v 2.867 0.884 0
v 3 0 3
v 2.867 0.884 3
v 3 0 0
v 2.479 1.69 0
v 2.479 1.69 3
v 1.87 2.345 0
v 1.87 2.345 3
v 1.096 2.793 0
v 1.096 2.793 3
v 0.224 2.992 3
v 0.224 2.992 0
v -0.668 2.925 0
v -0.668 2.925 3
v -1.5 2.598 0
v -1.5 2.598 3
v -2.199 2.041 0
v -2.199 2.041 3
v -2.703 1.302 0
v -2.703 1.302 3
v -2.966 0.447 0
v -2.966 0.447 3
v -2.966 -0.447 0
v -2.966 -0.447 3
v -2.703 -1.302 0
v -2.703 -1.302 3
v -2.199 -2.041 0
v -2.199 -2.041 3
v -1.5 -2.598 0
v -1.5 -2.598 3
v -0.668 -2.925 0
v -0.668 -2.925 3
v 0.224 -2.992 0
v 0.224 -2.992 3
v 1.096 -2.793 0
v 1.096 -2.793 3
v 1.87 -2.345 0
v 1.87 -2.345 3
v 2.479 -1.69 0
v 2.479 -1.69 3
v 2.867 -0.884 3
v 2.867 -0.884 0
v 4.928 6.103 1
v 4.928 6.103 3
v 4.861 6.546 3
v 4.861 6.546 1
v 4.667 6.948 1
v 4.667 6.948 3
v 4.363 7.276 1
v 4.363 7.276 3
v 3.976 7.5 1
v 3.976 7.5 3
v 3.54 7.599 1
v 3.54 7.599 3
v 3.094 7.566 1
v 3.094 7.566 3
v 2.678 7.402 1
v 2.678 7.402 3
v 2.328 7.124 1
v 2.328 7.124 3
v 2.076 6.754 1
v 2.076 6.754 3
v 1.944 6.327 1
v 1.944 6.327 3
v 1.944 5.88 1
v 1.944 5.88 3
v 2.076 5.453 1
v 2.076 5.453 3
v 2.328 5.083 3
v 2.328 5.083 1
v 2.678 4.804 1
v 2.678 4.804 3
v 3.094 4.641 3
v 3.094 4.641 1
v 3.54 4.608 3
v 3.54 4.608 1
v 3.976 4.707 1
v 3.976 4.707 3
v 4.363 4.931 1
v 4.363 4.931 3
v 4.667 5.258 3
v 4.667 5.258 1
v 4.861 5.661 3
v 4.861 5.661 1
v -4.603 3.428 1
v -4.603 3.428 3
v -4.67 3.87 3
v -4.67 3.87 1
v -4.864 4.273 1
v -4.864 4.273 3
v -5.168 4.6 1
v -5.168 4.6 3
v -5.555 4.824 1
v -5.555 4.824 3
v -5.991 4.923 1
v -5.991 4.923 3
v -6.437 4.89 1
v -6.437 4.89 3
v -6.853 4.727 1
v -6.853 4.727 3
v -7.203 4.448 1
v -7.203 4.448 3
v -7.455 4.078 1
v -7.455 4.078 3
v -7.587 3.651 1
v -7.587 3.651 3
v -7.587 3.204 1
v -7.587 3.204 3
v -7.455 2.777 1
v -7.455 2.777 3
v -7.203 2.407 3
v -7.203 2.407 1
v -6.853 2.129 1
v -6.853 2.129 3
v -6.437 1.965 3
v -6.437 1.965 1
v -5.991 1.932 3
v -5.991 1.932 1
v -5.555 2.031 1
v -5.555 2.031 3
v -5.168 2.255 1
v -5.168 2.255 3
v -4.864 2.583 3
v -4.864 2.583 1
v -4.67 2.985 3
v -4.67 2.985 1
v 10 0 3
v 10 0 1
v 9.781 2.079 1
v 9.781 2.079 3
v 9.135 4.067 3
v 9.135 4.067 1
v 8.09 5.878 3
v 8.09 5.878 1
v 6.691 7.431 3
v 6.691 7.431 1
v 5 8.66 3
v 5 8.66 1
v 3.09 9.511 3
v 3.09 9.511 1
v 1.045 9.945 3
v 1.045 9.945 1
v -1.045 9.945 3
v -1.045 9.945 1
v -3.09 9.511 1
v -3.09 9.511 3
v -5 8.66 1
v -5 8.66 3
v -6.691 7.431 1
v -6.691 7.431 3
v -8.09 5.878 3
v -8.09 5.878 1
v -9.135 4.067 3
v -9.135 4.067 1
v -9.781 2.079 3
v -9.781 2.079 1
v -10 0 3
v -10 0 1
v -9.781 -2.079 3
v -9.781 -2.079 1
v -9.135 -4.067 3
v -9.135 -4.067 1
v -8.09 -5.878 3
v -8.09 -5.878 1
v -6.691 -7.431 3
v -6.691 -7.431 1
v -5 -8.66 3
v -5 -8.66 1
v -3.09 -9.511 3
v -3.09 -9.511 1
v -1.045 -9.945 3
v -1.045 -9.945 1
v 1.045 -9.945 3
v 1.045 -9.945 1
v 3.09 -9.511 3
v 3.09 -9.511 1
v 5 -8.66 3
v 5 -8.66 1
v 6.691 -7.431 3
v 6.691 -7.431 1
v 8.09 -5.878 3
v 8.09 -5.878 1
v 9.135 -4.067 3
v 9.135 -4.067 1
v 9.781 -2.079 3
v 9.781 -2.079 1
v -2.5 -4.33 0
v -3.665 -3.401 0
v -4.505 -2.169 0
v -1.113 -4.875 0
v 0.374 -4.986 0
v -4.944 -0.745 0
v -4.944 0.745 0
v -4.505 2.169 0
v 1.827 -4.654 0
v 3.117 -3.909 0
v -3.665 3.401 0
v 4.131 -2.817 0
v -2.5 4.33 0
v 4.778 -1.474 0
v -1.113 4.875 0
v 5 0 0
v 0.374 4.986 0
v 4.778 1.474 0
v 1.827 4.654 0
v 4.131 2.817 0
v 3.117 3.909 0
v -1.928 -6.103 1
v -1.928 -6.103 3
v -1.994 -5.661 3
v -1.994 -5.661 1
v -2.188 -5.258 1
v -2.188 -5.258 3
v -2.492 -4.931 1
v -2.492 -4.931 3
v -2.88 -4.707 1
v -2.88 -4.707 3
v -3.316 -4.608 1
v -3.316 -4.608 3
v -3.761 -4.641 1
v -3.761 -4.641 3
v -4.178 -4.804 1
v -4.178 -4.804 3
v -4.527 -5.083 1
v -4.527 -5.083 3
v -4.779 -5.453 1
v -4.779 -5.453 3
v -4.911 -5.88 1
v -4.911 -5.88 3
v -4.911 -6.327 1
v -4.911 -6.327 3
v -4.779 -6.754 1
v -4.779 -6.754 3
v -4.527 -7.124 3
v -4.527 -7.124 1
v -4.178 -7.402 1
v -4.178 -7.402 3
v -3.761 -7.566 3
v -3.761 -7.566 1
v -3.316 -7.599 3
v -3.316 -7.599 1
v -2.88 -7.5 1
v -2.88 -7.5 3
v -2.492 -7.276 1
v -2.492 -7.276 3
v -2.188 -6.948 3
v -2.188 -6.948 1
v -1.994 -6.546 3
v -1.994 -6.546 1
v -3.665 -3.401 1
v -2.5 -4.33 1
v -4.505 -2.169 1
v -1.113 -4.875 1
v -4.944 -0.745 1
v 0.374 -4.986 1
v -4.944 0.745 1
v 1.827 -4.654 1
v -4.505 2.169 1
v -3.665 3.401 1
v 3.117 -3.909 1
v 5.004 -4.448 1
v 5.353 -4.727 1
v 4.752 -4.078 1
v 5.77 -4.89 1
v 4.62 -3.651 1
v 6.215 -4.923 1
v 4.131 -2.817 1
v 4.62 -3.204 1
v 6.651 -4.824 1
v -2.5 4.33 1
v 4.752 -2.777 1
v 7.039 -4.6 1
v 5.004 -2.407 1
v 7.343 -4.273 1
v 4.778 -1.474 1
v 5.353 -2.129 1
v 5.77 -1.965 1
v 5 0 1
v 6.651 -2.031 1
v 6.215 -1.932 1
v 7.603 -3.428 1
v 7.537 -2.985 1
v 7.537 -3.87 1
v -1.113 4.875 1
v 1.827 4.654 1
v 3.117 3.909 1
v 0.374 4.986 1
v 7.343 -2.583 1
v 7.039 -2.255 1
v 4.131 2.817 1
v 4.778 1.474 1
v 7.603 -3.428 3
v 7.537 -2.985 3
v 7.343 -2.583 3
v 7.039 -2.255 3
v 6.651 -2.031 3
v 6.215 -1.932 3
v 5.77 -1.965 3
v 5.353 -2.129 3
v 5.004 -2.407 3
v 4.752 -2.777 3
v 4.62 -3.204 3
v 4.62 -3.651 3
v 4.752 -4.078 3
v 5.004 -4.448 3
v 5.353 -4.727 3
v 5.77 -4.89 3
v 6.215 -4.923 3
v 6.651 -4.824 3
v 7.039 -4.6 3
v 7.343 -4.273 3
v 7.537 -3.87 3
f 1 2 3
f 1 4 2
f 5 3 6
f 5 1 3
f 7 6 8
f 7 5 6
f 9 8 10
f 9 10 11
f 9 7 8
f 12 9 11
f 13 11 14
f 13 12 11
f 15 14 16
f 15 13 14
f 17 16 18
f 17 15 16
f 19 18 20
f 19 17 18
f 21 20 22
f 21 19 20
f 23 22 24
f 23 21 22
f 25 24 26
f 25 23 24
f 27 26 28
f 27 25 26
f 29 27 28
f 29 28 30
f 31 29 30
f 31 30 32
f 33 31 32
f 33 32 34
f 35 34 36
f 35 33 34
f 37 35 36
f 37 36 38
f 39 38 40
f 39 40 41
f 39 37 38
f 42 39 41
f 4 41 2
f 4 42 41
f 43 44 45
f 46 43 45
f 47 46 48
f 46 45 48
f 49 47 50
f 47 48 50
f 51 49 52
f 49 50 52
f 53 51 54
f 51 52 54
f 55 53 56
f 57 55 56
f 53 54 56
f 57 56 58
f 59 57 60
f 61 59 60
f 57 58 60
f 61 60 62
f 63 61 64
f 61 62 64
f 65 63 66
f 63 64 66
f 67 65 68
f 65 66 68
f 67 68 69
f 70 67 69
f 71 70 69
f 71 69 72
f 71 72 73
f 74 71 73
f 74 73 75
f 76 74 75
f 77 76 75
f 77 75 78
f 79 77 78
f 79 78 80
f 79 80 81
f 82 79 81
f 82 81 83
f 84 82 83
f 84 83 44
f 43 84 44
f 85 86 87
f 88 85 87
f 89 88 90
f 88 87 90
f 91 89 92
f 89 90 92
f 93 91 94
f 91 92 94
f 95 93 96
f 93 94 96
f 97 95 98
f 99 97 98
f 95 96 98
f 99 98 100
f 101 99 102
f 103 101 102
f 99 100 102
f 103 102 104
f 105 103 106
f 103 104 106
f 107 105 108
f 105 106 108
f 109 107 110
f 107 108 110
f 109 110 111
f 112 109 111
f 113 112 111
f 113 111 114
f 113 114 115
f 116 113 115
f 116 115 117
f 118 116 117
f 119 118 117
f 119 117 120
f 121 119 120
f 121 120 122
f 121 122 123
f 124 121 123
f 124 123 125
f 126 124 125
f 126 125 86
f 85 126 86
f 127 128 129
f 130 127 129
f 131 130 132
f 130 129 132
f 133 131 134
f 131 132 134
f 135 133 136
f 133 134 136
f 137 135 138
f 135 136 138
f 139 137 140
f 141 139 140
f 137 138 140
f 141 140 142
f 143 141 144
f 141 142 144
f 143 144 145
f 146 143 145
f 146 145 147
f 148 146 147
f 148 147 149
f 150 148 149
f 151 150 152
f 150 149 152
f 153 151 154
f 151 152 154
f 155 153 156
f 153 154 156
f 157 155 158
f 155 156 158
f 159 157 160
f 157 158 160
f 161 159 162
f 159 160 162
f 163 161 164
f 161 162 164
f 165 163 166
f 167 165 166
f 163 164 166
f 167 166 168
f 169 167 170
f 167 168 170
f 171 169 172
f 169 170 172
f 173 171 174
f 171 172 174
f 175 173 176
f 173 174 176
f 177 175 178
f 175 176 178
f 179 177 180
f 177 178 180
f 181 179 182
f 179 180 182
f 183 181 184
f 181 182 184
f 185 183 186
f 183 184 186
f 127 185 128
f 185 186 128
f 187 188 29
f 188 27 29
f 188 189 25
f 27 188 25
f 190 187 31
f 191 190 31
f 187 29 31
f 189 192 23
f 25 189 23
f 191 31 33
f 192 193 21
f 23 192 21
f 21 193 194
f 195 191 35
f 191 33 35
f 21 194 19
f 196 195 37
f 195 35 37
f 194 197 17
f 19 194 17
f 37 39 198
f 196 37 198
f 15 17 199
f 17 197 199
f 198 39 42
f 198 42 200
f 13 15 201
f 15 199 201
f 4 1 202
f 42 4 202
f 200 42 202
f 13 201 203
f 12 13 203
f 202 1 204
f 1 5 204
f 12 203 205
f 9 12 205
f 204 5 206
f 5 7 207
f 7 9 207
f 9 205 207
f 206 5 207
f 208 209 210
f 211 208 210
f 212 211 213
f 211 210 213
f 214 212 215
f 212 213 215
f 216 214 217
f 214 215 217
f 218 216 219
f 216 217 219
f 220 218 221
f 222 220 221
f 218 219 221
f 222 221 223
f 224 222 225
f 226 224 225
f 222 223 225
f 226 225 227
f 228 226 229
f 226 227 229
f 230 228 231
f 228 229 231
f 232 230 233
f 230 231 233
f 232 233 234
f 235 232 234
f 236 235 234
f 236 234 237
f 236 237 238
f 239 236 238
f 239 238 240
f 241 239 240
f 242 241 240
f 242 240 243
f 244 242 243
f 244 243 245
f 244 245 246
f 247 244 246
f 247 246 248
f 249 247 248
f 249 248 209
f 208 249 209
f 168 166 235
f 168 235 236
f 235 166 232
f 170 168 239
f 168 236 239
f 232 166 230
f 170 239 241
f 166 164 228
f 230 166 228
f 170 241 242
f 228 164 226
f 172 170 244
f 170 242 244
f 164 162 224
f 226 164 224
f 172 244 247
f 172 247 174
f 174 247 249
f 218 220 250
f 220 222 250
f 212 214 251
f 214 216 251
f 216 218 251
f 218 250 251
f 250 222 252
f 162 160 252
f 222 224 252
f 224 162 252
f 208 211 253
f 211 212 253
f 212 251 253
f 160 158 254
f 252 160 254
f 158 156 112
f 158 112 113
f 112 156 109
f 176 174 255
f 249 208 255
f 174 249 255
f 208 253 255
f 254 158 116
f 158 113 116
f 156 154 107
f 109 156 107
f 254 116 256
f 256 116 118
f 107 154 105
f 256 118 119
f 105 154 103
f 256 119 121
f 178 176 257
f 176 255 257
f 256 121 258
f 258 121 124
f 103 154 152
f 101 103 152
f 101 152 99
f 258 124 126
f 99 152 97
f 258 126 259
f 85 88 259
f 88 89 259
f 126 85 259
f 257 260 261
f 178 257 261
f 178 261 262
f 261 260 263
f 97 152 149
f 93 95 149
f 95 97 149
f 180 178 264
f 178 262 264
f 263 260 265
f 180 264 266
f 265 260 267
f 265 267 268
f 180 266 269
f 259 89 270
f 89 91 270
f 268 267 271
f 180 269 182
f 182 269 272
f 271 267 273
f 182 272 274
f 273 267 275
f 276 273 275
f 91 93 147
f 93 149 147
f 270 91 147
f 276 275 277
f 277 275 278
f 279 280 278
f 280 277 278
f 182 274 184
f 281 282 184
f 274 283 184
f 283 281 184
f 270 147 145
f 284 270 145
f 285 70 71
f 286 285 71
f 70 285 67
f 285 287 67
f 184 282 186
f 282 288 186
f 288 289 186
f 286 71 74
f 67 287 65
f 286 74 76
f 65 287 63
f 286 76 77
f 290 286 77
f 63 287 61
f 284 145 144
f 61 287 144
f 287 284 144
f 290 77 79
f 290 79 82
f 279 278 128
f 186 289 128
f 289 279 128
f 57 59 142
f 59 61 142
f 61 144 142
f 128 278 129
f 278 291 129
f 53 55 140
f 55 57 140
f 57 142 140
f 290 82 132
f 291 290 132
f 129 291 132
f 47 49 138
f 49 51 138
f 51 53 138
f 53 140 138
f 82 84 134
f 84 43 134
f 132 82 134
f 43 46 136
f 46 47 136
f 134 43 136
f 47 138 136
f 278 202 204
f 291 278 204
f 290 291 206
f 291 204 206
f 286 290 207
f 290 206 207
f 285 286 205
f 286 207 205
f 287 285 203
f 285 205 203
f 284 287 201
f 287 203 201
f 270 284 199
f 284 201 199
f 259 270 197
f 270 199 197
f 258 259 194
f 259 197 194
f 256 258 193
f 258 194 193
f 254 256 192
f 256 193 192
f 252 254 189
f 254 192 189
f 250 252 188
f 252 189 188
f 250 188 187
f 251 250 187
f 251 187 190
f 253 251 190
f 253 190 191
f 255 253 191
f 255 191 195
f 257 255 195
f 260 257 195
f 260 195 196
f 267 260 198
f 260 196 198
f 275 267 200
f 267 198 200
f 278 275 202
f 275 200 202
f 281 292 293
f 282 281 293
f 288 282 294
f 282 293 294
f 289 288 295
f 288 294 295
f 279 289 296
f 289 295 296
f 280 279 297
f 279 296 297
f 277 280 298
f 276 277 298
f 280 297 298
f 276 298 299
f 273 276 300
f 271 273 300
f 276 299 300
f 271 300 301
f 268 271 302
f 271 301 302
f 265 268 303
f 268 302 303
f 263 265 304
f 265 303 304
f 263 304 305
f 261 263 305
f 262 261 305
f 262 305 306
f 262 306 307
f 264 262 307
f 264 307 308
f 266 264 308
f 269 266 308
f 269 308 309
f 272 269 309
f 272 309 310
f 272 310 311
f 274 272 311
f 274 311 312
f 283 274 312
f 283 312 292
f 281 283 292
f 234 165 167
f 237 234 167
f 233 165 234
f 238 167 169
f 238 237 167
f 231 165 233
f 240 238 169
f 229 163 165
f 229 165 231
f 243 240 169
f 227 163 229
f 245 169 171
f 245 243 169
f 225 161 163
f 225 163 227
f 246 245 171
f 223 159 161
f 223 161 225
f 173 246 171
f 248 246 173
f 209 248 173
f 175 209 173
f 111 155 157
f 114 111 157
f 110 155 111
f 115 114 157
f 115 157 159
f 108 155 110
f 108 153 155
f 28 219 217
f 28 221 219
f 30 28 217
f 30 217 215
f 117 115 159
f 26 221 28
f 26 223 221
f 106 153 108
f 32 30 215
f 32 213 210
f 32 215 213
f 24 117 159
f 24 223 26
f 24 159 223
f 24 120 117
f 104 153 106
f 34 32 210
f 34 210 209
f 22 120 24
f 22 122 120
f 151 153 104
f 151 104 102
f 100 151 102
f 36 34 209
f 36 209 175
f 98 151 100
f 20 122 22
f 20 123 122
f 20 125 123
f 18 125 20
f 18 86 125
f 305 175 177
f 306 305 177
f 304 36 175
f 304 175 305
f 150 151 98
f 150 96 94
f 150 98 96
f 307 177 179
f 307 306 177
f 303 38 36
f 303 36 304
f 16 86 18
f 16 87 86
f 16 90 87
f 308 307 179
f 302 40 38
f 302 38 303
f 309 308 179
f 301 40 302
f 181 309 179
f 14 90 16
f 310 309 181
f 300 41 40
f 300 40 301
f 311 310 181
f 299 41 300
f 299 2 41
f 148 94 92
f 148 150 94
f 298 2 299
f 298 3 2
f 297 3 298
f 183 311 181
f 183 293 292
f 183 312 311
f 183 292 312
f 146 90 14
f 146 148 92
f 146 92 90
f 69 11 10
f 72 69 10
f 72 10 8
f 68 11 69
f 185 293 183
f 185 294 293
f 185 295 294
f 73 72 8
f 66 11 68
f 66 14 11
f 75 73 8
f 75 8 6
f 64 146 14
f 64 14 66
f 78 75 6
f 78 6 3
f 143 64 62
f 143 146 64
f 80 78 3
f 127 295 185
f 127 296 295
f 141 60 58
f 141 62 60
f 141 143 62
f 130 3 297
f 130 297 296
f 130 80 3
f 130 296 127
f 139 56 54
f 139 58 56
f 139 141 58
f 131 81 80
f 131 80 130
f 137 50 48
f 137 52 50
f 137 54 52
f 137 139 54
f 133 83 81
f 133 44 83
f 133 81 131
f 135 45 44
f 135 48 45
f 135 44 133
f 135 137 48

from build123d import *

# Parameters (mm, degrees)
SKETCH_1_R          = 5
SKETCH_1_R_2        = 3
EXTRUDE_1_DEPTH     = 1
SKETCH_2_R          = 10
SKETCH_2_R_2        = 3
EXTRUDE_2_DEPTH     = 2
SKETCH_3_R          = 1.5
CUT_EXTRUDE_1_DEPTH = 15.456832295


with BuildPart() as part:
    # 草图1 → 凸台-拉伸1 (new body)
    with BuildSketch(Plane.XY):
        Circle(SKETCH_1_R)
        Circle(SKETCH_1_R_2, mode=Mode.SUBTRACT)
    extrude(amount=EXTRUDE_1_DEPTH)

    # 草图2 → 凸台-拉伸2 (add)
    with BuildSketch(Plane.XY.offset(1)):
        Circle(SKETCH_2_R)
        Circle(SKETCH_2_R_2, mode=Mode.SUBTRACT)
    extrude(amount=EXTRUDE_2_DEPTH)

    # 草图3 → 切除-拉伸1 (cut, through all)
    with BuildSketch(Plane.XY.offset(3)):
        with Locations((3.427604113, 6.103403153)):
            Circle(SKETCH_3_R)
        with Locations((6.103403153, -3.427604113)):
            Circle(SKETCH_3_R)
        with Locations((-3.427604113, -6.103403153)):
            Circle(SKETCH_3_R)
        with Locations((-6.103403153, 3.427604113)):
            Circle(SKETCH_3_R)
    extrude(amount=-CUT_EXTRUDE_1_DEPTH, mode=Mode.SUBTRACT)


solid = part.part
